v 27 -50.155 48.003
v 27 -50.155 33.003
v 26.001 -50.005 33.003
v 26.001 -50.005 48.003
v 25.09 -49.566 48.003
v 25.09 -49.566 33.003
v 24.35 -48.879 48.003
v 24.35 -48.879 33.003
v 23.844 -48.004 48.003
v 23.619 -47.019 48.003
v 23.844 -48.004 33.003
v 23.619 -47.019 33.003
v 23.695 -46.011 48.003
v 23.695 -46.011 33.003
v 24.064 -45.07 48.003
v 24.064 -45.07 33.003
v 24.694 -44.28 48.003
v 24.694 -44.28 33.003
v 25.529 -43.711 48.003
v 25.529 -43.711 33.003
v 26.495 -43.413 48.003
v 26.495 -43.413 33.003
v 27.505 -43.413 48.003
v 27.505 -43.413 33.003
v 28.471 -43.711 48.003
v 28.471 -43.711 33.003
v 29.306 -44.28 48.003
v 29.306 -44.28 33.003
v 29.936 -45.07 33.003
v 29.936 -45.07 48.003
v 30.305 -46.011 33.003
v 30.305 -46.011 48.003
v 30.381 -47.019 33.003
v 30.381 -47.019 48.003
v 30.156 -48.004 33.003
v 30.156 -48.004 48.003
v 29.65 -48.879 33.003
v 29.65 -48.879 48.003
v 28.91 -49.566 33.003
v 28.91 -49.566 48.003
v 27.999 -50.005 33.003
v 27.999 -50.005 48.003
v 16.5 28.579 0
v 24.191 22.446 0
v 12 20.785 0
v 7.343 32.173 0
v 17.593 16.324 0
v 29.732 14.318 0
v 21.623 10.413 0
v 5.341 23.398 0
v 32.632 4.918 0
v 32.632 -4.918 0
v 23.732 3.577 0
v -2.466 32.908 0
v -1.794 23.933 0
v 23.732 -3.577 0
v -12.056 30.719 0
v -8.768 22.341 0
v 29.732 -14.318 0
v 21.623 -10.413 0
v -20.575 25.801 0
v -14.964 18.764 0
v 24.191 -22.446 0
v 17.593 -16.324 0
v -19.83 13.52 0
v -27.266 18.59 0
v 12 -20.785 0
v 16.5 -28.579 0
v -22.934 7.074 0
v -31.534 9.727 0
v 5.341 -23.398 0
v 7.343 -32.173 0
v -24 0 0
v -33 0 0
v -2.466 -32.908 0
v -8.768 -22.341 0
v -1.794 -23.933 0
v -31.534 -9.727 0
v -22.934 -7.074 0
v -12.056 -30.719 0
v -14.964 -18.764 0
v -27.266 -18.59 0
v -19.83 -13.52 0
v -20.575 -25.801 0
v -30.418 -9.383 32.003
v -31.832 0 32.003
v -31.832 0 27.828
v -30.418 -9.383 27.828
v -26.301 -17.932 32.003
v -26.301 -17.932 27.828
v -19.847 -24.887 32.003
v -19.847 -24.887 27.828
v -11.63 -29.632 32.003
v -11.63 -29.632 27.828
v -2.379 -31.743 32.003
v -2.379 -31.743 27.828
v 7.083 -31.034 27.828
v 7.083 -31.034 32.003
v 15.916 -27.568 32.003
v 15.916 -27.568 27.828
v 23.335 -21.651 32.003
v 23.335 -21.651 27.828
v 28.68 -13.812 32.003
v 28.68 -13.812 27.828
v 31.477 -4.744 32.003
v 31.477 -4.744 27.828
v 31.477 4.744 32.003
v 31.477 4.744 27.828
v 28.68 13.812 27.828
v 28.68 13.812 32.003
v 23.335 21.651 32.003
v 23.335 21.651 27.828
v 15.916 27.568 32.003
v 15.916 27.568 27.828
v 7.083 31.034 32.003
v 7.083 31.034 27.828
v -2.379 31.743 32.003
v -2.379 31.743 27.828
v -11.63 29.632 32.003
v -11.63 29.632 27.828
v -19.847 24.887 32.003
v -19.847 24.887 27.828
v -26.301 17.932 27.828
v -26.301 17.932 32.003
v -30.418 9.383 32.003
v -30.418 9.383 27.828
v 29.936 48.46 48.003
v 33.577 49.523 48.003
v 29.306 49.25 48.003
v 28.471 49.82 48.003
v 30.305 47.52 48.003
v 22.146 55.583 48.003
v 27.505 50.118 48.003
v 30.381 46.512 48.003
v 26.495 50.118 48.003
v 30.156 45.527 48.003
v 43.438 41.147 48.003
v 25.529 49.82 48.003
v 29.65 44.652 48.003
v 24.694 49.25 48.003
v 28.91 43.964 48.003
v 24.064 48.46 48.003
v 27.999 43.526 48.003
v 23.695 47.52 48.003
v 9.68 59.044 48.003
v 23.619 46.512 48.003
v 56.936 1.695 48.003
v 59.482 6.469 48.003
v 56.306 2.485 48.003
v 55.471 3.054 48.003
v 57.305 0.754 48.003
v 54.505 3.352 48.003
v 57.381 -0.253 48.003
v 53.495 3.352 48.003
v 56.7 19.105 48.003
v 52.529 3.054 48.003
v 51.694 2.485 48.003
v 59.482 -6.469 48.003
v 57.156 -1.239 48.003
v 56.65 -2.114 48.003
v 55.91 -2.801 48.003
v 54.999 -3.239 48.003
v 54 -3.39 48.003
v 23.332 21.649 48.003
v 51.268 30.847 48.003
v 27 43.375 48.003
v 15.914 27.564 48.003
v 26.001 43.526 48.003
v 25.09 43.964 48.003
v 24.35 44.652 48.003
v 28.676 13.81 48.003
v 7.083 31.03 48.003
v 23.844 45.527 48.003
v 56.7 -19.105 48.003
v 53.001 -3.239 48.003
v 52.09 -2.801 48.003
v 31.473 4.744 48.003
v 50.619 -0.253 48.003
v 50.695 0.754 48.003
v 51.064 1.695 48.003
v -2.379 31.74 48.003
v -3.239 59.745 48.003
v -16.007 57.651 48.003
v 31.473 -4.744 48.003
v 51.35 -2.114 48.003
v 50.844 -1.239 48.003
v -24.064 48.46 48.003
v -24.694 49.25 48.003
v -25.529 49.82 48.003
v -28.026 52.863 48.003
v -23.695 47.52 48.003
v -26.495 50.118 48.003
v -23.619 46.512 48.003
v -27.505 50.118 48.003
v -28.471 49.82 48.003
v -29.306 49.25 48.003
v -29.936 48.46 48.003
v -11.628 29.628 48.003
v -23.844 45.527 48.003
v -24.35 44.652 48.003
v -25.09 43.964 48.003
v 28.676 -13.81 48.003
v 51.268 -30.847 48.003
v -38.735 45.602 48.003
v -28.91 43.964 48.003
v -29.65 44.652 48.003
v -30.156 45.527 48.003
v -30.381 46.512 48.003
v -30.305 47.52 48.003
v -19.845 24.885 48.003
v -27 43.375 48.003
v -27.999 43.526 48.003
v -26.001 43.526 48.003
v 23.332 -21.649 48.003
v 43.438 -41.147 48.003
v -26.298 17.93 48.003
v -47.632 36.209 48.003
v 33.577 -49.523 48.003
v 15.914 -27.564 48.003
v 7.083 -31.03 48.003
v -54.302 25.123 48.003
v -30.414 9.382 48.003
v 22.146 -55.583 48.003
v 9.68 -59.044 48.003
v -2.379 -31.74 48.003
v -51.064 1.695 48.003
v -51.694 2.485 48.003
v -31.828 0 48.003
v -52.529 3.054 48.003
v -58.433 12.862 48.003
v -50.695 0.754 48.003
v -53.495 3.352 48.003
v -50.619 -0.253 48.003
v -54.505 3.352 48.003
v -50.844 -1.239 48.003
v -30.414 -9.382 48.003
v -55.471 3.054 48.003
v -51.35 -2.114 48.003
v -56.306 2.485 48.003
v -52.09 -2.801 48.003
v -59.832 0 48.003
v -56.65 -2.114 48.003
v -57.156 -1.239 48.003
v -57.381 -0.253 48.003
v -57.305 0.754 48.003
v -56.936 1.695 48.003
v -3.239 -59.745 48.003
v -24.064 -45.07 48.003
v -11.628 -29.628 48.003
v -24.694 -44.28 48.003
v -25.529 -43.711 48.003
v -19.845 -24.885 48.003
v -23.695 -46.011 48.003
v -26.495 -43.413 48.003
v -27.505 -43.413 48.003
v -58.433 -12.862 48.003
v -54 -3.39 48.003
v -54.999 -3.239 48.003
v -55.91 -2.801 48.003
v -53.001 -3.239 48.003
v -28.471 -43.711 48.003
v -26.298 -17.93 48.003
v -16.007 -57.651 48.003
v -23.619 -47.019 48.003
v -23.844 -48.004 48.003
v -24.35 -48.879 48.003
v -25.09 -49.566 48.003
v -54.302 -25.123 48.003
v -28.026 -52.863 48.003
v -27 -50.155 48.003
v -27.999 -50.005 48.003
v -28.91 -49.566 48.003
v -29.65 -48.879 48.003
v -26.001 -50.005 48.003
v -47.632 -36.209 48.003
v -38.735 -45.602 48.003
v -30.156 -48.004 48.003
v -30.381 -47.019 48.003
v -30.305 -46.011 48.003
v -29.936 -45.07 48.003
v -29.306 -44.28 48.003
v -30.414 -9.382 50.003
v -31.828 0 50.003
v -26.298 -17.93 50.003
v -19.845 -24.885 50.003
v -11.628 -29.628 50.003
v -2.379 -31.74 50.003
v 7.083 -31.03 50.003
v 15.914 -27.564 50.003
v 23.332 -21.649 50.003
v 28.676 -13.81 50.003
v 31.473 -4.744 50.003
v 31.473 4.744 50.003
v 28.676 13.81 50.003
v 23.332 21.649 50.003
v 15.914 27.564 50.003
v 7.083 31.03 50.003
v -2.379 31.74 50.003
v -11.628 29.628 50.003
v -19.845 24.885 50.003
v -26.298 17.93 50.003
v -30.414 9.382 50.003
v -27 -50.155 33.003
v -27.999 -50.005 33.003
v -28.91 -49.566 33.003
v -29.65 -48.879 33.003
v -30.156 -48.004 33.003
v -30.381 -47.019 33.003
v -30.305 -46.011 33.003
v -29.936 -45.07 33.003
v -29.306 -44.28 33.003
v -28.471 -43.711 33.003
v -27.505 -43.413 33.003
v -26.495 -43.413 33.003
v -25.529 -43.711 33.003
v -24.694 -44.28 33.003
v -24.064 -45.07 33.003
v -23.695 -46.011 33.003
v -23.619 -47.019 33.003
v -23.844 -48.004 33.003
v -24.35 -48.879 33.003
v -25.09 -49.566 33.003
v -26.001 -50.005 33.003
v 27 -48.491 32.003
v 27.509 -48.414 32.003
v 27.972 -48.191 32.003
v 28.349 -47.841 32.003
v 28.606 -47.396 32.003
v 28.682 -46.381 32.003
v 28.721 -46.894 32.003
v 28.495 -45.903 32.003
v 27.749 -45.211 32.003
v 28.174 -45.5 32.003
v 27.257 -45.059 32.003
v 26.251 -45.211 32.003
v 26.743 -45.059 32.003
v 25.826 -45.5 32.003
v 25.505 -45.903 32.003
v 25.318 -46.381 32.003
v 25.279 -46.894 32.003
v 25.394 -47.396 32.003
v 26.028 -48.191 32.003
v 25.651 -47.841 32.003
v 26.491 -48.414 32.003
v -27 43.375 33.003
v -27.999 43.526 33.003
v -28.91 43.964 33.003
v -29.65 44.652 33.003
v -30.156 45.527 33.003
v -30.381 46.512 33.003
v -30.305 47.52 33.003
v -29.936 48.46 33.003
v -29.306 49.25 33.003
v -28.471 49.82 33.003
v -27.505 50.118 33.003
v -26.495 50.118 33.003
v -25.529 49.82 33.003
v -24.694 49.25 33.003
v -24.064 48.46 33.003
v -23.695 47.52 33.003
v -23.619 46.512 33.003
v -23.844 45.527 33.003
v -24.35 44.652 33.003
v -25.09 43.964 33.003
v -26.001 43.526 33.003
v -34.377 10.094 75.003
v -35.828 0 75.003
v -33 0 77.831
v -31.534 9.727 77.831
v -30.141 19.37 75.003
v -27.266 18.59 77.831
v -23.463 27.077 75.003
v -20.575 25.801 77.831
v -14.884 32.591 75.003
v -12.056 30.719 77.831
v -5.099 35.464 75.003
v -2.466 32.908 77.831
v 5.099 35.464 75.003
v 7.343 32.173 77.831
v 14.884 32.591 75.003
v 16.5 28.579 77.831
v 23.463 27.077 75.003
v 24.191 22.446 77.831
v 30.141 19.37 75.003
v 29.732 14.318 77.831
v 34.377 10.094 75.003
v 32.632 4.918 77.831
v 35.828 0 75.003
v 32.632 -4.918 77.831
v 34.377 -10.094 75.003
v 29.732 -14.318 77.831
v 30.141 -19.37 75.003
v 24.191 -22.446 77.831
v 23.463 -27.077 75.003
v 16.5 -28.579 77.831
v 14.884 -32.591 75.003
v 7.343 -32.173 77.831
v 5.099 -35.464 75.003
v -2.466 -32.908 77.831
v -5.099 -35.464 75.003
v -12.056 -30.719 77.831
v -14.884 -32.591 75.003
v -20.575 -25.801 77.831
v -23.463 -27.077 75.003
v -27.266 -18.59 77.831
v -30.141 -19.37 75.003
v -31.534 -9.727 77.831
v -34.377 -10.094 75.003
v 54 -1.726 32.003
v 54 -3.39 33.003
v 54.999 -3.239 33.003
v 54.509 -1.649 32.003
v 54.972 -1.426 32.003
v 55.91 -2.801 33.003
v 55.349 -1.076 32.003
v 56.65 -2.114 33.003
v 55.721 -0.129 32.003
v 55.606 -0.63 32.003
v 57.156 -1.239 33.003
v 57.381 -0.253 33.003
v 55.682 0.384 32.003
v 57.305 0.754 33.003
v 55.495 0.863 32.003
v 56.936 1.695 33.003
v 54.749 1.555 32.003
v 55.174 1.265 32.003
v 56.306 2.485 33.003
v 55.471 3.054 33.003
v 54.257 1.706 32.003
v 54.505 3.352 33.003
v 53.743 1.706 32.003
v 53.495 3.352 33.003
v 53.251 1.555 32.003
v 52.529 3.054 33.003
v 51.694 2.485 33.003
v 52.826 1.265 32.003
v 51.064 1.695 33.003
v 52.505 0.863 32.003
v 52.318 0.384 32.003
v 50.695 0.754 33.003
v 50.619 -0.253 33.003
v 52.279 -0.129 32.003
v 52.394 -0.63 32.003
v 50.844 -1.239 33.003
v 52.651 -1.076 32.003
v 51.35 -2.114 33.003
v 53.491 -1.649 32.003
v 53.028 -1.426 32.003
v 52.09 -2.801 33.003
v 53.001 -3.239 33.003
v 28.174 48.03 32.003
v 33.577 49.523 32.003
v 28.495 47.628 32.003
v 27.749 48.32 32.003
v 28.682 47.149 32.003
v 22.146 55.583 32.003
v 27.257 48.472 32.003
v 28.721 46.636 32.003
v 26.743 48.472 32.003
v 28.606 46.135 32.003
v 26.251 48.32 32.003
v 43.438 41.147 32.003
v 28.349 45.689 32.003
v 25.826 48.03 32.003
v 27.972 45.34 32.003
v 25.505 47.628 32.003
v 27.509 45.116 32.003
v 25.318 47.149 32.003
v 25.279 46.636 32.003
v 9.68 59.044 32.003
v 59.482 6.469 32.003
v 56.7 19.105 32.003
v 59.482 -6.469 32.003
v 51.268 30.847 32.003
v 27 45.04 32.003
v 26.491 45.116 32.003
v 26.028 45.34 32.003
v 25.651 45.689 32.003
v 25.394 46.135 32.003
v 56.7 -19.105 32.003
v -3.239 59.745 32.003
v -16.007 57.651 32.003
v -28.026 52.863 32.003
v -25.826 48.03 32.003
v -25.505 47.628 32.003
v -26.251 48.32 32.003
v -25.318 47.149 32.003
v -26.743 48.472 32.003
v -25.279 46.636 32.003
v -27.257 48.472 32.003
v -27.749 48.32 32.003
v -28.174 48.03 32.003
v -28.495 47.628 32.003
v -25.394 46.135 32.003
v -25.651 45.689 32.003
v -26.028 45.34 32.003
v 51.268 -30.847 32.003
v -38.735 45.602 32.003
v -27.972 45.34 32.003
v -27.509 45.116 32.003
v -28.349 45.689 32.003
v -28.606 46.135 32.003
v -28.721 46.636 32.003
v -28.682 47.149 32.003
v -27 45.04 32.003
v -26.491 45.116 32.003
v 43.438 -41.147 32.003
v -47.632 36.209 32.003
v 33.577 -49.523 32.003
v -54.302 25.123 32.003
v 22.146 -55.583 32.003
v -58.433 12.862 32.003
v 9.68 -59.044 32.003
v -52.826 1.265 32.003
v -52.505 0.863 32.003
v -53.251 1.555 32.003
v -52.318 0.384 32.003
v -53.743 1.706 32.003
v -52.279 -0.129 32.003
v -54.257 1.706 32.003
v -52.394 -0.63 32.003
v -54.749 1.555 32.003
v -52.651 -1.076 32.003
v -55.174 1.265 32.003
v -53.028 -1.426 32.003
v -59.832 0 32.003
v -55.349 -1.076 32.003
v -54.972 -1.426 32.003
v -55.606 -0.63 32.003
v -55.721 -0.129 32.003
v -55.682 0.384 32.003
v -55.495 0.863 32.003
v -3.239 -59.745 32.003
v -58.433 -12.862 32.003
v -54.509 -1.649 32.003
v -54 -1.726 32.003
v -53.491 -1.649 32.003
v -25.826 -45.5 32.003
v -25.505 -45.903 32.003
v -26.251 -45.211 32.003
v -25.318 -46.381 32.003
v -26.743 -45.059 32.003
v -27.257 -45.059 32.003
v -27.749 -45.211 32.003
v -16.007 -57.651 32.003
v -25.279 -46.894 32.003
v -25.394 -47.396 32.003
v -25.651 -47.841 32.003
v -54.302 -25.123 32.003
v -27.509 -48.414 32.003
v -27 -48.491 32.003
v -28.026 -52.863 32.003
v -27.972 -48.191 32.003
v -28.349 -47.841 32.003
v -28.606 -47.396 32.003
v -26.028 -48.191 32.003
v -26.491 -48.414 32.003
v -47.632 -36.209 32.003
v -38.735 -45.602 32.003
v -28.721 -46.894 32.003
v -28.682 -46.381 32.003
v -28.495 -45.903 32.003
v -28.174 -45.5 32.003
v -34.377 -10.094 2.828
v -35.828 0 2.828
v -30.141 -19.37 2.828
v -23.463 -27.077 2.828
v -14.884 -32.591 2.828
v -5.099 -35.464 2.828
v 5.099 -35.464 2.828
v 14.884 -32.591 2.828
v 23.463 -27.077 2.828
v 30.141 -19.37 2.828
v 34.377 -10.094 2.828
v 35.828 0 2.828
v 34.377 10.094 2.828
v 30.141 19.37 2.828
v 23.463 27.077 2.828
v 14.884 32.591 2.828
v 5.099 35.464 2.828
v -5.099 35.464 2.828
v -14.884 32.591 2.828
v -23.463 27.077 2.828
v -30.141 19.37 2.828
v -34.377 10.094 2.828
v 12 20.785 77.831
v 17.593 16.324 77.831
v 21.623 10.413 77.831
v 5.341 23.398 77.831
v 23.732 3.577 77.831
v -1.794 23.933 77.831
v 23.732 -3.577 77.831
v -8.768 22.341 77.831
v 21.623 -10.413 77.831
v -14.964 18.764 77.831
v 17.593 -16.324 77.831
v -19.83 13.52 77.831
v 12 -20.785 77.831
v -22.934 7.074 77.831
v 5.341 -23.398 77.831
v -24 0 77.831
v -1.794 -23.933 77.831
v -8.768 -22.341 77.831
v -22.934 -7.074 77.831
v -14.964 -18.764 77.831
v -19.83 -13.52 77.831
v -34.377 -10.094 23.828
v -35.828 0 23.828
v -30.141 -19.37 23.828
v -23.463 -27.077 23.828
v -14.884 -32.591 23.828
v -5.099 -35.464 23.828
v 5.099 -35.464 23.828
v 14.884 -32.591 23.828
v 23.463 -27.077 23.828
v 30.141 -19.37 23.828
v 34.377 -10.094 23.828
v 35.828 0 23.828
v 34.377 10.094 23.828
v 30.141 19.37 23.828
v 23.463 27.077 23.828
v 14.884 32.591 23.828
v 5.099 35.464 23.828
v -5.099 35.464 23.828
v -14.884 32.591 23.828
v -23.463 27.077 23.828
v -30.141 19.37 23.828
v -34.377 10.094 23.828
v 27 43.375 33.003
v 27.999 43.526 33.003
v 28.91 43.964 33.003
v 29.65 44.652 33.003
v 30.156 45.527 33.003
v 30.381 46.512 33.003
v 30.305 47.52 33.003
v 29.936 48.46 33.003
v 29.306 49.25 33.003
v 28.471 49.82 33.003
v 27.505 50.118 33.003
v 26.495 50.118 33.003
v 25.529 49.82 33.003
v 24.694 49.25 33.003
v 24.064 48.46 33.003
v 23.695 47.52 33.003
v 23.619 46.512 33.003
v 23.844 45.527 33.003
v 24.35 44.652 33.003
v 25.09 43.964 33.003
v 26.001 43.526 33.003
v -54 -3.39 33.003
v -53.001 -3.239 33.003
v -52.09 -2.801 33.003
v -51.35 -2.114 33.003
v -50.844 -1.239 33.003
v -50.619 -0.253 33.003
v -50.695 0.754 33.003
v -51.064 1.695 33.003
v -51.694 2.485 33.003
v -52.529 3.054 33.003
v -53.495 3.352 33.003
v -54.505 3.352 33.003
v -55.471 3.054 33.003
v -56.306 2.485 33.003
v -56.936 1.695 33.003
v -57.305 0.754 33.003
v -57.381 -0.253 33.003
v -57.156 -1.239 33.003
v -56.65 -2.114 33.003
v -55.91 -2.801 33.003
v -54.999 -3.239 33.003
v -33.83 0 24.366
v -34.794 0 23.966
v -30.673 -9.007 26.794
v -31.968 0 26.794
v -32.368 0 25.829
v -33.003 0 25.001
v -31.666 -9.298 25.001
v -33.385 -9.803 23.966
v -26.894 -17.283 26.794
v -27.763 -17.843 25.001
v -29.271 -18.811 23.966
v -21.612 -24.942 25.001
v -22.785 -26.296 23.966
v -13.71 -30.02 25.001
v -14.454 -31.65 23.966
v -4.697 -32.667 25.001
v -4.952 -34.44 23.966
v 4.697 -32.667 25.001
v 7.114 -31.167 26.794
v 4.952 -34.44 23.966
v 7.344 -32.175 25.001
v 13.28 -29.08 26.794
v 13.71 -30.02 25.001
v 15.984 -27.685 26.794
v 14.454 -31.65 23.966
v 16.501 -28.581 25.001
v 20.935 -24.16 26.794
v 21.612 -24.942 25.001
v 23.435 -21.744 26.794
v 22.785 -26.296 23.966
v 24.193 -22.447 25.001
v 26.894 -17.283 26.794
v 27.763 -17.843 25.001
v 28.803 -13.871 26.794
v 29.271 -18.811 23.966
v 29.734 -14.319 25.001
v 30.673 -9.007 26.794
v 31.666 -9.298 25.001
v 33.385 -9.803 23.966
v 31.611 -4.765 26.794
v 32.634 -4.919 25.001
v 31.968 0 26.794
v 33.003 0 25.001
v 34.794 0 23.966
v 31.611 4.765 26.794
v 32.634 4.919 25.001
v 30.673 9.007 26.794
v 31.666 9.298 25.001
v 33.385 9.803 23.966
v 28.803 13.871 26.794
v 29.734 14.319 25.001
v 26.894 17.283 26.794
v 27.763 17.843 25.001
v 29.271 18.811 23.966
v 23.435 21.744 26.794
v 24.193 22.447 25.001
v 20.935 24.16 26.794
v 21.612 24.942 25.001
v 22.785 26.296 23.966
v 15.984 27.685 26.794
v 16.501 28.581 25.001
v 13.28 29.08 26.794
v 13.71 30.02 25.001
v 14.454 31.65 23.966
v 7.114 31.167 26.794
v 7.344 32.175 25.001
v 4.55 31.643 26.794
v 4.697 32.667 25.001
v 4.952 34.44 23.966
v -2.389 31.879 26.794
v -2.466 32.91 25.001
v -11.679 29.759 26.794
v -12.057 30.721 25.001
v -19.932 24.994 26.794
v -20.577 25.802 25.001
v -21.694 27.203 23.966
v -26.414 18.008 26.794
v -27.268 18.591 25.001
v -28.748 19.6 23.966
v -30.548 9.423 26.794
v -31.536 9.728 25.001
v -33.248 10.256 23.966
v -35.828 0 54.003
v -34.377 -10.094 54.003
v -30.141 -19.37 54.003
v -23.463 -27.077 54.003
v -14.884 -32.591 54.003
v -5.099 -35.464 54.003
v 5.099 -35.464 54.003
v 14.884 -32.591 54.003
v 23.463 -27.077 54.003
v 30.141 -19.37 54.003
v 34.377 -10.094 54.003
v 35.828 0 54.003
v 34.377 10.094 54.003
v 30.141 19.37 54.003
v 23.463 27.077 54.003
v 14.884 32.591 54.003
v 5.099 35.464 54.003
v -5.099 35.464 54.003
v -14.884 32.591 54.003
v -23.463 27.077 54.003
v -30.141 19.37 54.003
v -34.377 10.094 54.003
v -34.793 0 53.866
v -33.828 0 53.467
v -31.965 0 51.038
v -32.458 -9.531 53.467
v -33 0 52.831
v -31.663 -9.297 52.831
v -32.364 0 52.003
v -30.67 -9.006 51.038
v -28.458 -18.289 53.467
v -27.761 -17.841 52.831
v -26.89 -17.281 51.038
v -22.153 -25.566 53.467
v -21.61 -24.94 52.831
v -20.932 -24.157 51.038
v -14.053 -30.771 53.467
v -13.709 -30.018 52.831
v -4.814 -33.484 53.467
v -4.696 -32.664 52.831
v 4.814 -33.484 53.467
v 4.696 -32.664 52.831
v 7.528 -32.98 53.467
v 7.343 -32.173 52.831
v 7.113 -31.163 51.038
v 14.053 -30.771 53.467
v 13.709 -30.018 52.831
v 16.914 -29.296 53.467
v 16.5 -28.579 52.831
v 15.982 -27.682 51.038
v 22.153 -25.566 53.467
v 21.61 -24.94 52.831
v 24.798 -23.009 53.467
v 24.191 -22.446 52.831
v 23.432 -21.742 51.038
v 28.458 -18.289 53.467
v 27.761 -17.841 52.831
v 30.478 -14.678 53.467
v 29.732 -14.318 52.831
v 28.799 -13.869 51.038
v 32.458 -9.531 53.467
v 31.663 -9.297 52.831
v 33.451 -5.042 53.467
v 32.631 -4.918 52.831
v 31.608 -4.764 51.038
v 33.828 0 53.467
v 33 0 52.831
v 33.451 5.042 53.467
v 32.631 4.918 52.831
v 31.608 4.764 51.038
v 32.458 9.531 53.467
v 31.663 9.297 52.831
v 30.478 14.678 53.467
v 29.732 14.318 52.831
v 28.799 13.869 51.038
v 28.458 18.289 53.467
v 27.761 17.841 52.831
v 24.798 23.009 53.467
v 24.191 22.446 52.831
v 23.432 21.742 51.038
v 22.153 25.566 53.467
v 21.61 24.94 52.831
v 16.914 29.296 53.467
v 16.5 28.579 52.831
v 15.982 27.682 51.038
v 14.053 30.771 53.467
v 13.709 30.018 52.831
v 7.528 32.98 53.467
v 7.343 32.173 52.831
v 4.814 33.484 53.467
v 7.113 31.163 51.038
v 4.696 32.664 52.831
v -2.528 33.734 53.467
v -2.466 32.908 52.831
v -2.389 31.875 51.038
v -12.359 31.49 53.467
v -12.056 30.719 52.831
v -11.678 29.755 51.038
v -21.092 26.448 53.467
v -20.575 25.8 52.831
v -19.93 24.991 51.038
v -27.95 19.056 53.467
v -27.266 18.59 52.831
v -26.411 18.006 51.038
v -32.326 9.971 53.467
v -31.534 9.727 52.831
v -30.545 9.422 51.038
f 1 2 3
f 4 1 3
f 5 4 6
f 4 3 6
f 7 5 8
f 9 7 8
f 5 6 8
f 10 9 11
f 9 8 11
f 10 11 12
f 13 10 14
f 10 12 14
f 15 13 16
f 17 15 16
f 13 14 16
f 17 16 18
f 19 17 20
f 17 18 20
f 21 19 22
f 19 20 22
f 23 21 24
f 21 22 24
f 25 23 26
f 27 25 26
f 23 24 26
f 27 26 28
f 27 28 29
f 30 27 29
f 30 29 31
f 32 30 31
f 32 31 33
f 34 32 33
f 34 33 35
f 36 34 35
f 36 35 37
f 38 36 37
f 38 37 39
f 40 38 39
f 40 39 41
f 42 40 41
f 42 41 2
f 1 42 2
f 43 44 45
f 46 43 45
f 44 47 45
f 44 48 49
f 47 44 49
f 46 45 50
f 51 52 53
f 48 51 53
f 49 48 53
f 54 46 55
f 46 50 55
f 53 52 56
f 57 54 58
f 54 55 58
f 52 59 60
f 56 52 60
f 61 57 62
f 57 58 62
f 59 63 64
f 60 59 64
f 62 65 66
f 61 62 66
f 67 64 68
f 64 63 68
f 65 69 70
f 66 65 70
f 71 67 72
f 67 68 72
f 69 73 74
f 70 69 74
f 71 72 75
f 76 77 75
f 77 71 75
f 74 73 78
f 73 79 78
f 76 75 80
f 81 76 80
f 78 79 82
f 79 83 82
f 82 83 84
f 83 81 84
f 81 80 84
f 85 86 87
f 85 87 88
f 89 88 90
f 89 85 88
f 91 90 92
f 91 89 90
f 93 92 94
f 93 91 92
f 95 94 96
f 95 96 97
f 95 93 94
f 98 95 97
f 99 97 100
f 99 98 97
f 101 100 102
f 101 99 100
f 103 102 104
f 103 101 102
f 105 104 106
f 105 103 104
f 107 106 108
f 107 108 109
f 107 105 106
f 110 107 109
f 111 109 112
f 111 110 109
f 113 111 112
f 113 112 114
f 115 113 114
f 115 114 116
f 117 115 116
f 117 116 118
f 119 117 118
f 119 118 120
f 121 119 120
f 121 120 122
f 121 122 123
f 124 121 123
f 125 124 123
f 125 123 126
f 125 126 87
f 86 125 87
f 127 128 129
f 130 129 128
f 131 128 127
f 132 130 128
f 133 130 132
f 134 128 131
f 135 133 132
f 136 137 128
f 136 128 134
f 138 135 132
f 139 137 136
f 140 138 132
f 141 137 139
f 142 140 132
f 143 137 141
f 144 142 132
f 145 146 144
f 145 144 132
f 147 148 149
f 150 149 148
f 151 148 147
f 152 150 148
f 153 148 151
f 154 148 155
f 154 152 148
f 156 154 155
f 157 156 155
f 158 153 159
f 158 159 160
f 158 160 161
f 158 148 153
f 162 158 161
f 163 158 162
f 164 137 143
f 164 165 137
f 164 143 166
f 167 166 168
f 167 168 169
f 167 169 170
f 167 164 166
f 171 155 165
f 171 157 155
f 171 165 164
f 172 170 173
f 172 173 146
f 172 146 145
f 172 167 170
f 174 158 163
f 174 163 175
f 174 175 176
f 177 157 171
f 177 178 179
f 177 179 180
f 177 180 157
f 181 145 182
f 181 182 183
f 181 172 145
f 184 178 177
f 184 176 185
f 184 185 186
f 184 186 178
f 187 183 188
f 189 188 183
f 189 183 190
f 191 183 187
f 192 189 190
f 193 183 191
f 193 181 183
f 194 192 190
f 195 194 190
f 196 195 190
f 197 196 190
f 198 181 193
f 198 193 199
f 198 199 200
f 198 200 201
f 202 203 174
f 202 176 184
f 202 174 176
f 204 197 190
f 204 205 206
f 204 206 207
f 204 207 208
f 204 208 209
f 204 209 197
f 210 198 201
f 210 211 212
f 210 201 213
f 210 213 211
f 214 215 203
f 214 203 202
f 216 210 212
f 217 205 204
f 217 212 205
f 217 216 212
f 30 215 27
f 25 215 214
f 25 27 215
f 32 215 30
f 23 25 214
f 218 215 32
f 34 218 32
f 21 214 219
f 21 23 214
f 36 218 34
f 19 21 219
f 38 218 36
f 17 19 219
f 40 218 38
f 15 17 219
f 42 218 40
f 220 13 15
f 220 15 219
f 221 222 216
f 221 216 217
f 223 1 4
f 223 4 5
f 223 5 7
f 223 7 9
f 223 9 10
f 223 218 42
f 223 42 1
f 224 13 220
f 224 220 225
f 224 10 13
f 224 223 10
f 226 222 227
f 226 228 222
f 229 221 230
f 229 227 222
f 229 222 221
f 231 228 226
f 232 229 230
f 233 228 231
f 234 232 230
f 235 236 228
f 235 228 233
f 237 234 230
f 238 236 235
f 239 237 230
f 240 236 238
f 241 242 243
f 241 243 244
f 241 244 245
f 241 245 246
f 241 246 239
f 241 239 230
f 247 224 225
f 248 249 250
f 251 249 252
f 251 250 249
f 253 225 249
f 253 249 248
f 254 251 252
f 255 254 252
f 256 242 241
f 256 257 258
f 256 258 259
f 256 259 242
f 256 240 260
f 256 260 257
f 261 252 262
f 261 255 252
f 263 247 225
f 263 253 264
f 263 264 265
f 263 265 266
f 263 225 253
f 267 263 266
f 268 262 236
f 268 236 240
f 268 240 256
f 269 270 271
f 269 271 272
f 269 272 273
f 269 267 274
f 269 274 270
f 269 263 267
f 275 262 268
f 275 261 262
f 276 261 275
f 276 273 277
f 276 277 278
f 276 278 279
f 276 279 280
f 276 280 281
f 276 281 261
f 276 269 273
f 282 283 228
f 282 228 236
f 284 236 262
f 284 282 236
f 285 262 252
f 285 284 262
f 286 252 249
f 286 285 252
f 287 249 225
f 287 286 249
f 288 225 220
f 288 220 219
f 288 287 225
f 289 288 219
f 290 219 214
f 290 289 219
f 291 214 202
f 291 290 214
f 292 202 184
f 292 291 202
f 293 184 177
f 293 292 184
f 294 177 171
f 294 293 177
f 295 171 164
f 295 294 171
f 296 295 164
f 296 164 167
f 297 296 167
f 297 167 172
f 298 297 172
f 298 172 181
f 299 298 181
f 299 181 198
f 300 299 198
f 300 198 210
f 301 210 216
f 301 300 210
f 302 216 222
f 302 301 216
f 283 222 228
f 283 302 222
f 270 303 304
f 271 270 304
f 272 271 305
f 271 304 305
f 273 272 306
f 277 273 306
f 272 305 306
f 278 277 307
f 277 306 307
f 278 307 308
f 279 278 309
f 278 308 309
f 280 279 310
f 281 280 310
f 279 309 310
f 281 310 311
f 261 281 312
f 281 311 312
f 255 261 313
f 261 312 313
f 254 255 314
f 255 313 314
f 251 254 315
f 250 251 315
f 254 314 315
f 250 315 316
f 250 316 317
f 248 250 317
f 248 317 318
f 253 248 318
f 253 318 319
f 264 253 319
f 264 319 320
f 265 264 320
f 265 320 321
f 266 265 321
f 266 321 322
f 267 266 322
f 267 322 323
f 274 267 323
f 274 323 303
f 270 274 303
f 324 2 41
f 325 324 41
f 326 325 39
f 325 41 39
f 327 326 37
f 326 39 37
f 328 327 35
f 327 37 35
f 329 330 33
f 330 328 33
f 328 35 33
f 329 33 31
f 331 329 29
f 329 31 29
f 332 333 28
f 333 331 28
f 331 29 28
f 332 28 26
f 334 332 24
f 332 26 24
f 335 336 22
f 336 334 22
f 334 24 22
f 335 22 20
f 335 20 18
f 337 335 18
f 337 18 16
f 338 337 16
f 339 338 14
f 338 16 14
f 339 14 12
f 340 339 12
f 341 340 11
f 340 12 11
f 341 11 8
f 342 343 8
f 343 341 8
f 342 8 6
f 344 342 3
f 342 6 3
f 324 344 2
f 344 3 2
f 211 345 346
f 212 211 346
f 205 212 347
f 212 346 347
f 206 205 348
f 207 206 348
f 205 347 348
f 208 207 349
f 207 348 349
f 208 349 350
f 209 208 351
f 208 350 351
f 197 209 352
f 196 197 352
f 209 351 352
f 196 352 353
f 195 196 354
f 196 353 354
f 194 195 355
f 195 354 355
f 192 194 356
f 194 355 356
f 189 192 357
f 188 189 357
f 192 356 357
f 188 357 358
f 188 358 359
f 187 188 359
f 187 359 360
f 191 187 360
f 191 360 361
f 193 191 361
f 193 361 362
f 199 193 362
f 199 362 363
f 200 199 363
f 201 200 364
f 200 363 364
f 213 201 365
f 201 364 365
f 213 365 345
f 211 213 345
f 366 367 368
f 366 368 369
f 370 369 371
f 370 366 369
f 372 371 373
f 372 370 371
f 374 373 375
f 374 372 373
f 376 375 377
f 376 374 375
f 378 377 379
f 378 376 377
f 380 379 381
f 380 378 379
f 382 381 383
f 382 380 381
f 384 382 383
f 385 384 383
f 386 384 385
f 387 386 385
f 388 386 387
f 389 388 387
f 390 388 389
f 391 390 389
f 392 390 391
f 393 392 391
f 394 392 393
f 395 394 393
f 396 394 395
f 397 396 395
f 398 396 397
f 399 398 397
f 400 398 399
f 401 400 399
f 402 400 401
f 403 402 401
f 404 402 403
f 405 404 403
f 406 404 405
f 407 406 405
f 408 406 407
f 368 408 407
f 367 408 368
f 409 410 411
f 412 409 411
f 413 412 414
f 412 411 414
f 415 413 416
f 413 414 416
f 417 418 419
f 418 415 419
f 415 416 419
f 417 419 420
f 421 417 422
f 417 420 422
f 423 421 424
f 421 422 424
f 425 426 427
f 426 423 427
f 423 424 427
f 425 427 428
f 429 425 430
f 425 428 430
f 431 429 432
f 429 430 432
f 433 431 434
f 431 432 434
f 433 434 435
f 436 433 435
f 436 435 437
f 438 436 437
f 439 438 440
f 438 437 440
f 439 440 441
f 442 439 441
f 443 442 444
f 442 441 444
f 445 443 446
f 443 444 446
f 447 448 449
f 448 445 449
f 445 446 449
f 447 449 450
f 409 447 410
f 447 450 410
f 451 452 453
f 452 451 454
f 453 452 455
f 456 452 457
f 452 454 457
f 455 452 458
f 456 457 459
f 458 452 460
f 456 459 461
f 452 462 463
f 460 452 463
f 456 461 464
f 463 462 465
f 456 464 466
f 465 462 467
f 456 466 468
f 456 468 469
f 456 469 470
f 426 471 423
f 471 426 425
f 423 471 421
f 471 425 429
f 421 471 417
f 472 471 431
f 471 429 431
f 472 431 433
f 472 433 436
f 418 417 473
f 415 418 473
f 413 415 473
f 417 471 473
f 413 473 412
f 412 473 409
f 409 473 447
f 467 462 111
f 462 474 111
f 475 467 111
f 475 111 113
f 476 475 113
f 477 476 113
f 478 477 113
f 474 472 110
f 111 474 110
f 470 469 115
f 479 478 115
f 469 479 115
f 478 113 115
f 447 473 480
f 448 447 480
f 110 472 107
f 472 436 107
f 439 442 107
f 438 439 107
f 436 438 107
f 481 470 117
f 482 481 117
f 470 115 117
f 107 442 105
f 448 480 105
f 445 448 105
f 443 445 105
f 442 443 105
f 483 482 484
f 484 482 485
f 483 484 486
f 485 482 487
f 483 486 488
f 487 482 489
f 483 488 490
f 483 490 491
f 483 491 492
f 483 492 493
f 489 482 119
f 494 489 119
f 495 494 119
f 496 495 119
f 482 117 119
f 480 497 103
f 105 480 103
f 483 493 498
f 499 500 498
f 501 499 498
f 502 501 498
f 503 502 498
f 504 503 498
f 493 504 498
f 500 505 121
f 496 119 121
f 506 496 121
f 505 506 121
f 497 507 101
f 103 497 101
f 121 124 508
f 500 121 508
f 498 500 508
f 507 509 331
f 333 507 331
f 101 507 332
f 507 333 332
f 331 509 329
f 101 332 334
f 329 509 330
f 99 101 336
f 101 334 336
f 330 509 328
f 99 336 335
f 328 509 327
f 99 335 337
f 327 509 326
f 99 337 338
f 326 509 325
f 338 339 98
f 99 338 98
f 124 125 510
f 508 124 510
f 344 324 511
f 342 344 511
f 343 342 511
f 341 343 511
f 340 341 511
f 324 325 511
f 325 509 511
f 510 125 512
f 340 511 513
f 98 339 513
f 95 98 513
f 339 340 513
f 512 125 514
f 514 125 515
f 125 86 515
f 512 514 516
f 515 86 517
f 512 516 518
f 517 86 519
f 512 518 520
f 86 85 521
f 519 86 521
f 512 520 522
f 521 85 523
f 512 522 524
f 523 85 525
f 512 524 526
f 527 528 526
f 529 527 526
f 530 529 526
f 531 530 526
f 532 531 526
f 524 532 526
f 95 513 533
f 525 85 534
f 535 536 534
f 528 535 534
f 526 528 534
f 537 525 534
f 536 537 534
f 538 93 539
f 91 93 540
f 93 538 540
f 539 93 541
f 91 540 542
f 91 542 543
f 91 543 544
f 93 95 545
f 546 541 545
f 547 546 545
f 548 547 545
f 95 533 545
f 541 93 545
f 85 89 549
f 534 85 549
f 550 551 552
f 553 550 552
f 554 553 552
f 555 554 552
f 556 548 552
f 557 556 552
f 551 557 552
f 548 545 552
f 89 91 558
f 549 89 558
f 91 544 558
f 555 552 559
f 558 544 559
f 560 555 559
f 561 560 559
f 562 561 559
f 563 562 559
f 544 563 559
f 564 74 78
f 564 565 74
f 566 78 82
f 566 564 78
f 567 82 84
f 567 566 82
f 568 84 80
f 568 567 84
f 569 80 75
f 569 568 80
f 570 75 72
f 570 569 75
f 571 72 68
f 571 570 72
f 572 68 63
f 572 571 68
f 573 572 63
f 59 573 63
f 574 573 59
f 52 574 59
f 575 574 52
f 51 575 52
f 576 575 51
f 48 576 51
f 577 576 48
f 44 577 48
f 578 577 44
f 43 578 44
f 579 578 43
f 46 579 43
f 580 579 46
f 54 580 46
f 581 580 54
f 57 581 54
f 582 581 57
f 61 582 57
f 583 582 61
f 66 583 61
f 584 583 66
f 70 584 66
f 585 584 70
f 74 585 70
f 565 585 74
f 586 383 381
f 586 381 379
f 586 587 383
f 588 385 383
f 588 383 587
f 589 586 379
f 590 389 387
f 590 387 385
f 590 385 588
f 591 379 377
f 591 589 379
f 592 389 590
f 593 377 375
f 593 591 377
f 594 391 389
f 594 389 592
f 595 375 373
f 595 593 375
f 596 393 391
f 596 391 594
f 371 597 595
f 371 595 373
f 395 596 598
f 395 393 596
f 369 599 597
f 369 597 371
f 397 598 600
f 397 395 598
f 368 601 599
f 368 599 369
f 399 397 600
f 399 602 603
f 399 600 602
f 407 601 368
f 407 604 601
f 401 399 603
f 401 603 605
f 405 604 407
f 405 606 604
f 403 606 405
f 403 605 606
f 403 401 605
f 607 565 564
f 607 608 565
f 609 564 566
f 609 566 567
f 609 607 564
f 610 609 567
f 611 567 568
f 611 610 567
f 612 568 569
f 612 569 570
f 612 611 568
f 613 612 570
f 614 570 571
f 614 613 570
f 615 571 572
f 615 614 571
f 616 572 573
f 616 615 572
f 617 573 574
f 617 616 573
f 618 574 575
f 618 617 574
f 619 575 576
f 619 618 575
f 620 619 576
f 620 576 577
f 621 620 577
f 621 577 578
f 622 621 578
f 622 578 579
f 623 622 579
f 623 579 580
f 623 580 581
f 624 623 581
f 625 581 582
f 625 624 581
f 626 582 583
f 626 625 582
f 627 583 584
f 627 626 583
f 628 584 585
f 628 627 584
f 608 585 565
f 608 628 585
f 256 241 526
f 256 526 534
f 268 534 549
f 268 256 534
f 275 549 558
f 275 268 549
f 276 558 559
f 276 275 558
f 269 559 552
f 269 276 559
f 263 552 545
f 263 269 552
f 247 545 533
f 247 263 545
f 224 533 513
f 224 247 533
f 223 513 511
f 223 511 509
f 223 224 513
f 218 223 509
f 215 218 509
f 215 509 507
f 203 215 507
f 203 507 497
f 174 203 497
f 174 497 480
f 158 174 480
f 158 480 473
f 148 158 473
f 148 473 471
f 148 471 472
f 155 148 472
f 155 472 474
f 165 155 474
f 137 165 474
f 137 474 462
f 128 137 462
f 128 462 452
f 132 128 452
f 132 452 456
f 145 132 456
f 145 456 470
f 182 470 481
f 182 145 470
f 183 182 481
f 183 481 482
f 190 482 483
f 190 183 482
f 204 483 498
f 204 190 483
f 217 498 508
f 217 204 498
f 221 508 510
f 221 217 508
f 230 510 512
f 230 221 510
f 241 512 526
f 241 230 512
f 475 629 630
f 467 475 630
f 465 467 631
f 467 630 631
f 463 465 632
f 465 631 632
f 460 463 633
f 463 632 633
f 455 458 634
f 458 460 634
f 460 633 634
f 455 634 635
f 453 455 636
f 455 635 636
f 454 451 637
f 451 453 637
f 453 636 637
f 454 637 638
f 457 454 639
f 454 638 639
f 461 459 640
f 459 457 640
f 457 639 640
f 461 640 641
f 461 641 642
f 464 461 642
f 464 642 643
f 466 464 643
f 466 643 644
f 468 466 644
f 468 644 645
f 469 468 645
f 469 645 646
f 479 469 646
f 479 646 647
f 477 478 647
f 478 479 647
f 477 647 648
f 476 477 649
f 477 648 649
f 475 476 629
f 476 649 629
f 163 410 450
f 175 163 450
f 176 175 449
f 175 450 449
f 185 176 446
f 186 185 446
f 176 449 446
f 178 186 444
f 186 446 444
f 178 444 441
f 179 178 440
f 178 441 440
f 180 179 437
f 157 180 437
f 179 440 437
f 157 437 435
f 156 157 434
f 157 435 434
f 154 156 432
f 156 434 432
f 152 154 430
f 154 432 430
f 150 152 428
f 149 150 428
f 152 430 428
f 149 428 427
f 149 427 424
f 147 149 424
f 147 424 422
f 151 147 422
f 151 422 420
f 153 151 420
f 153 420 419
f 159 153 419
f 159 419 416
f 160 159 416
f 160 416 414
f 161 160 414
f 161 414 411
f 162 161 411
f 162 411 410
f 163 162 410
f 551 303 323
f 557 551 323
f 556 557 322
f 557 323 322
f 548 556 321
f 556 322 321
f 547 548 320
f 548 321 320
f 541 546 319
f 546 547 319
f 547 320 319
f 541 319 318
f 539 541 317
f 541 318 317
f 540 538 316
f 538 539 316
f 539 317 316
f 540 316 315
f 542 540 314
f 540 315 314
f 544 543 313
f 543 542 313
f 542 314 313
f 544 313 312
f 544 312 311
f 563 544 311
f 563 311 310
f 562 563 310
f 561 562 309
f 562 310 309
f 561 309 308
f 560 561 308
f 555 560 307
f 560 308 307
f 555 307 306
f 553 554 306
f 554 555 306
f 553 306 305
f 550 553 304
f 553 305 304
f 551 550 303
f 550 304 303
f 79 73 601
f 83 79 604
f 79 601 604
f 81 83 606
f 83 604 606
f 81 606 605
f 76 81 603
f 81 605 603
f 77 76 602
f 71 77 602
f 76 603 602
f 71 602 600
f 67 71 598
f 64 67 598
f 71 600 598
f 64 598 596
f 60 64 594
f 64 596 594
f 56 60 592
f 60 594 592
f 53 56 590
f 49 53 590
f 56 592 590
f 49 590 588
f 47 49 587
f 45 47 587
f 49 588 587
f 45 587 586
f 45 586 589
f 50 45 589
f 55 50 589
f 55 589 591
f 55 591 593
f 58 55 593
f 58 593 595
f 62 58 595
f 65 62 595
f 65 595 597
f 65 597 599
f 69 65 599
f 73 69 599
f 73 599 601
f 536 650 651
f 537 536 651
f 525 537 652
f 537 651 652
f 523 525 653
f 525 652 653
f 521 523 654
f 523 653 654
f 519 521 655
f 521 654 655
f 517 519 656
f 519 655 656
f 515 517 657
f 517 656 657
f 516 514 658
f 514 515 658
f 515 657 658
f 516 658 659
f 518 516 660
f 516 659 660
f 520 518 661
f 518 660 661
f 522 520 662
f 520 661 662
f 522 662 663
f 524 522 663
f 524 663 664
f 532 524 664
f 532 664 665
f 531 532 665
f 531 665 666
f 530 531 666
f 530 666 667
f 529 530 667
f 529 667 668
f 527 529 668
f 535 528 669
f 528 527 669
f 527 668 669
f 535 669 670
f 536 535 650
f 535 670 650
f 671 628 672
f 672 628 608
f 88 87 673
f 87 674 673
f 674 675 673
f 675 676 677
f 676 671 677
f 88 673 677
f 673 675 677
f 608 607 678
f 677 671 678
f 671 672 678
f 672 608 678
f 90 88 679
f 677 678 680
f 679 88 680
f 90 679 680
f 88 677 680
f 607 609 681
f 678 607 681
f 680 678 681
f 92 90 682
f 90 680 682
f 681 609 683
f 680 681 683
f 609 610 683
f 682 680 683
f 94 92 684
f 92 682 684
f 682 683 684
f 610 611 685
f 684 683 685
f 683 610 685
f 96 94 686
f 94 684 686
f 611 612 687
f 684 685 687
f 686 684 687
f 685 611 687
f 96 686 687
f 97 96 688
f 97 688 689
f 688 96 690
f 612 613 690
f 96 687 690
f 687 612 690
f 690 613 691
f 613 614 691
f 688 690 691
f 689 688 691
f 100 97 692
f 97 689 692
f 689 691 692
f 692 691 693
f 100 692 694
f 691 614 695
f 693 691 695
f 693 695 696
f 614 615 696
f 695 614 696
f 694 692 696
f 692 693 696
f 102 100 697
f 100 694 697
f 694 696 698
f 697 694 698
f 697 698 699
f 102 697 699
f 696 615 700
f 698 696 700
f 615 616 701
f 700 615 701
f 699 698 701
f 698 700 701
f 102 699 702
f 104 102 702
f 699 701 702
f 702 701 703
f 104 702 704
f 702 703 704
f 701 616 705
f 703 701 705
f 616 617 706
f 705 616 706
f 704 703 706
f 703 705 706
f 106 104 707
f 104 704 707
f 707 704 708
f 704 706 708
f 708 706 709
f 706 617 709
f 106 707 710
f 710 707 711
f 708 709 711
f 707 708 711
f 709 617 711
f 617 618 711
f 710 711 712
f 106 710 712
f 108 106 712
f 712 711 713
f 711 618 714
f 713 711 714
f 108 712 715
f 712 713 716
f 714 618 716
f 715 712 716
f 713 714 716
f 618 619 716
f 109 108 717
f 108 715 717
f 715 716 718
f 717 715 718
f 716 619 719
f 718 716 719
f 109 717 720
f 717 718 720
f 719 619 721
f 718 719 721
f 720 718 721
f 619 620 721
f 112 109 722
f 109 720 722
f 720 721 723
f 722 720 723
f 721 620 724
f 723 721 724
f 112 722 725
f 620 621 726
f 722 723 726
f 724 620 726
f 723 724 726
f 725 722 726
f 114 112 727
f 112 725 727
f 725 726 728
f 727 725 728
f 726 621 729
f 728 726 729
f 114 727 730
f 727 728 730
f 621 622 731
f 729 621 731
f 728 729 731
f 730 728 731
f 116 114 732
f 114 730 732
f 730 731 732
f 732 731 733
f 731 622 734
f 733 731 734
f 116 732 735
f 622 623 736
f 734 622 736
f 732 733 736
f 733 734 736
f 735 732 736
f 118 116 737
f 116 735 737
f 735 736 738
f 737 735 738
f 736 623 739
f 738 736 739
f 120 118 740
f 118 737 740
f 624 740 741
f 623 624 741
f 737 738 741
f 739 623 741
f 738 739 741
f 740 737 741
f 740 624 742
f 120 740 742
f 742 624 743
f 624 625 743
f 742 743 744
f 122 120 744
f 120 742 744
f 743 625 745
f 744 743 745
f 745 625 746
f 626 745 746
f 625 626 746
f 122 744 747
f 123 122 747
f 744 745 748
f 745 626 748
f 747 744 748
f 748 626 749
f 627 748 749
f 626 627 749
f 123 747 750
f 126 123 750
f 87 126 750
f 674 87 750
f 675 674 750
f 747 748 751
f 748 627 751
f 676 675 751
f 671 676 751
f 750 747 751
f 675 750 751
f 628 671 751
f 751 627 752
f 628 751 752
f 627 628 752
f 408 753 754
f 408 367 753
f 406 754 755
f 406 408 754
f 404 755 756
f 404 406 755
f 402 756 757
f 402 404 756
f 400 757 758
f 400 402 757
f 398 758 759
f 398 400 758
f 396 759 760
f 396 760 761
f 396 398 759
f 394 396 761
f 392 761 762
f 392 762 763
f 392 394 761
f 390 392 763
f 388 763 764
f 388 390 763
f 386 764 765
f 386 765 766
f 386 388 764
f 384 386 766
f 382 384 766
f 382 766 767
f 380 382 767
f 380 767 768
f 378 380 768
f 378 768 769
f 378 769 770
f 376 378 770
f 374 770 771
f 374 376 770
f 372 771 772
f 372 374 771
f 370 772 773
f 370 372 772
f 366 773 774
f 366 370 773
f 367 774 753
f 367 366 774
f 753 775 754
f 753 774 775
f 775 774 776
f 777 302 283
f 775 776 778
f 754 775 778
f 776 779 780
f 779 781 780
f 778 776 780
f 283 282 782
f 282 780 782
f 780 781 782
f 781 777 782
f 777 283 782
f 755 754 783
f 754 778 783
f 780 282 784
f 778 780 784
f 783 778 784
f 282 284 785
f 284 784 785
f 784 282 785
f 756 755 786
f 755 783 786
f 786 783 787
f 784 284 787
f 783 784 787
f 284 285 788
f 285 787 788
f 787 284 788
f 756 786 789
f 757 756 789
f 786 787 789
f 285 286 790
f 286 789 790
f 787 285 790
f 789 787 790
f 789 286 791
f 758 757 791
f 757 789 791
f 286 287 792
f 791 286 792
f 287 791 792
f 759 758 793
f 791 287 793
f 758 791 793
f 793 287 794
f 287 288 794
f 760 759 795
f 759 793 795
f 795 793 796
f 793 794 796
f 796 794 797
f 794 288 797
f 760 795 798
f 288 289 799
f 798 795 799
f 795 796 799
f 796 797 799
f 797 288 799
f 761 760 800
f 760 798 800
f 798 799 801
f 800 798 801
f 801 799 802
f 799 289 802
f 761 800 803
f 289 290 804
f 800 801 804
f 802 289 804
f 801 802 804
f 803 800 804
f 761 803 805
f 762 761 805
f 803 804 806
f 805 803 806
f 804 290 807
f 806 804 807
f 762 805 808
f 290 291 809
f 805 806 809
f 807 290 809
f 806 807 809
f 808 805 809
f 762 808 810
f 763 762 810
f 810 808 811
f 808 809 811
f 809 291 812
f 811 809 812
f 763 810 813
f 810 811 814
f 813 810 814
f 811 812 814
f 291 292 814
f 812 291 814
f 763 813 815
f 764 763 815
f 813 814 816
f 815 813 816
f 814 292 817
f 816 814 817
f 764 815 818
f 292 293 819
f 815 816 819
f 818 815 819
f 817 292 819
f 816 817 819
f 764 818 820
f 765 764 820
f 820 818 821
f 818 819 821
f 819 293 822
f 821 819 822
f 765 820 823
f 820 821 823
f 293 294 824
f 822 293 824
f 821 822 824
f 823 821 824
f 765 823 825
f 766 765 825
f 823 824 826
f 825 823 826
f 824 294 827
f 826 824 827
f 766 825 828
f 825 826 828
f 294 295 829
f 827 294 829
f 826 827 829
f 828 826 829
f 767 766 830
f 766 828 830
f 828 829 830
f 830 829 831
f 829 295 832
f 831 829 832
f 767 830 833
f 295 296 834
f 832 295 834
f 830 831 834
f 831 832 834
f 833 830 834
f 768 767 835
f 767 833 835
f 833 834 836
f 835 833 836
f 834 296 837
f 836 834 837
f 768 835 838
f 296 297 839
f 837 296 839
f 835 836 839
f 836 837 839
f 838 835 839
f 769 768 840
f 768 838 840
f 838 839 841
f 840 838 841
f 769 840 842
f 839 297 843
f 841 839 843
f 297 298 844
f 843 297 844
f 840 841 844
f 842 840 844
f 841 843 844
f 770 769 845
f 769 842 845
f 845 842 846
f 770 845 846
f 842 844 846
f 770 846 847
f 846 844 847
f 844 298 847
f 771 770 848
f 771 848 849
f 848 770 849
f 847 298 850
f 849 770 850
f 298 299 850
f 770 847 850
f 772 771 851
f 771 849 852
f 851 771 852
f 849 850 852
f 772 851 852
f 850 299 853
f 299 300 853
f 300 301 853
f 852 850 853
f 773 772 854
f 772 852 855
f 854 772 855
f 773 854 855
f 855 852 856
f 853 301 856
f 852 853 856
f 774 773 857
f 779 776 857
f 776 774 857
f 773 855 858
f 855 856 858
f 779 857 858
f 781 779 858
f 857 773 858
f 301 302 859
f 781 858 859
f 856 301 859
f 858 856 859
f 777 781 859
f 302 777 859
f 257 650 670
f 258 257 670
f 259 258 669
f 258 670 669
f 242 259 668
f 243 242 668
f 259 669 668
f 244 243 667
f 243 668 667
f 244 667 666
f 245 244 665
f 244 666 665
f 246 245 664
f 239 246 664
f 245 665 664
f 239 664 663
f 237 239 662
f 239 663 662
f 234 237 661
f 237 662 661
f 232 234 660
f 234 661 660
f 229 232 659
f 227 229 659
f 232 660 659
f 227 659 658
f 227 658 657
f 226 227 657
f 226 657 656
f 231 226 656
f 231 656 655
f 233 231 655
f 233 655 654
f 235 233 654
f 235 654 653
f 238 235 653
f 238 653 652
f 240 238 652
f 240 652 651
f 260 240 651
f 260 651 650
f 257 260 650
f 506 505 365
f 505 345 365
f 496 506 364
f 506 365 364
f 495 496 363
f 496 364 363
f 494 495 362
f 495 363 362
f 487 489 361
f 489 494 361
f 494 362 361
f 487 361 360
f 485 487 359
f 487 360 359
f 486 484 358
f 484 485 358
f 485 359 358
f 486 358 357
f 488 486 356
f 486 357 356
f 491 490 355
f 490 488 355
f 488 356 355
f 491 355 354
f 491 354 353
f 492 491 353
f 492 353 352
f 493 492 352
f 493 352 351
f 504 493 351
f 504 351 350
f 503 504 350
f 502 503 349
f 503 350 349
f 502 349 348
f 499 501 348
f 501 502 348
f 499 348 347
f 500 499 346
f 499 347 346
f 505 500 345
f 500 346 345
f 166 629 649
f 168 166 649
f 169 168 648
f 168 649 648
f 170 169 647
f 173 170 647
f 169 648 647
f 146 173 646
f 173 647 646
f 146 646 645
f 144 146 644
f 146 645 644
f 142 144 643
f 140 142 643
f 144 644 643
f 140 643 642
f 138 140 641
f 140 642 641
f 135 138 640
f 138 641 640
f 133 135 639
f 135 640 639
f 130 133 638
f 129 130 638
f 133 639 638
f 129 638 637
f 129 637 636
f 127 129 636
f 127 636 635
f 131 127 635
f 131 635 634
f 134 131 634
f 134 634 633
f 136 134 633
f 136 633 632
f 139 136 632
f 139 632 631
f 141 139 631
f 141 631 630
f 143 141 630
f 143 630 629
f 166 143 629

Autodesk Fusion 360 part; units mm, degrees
sketch "Sketch1" plane through (0, 0, 0) normal (0, 1, 0) x (1, 0, 0)
  line L0 (-33.0001, 0) -> (-35.8285, -2.8284)
  line L1 (-33.0001, 0) -> (-33.002, 0) construction
  line L2 (-35.8285, -2.8284) -> (-35.8285, -23.8284)
  line L3 (-31.8323, -27.8284) -> (-31.8323, -32.0026)
  line L4 (-31.8323, -32.0026) -> (-59.8323, -32.0026)
  line L5 (-59.8323, -32.0026) -> (-59.8323, -48.0026)
  line L6 (-59.8323, -48.0026) -> (-31.8285, -48.0026)
  line L7 (-31.8285, -48.0026) -> (-31.8285, -50.0026)
  line L8 (-35.8285, -54.0026) -> (-35.8285, -75.0026)
  line L9 (-35.8285, -75.0026) -> (-33.0001, -77.8311)
  line L10 (-33.0001, -77.8311) -> (-1.0001, -77.8311)
  line L11 (-33.002, 0) -> (-1.002, 0)
  arc A0 (-35.8285, -54.0026) -> (-31.8285, -50.0026) centre (-35.8285, -50.0026) ccw
  arc A1 (-31.8323, -27.8284) -> (-35.8285, -23.8284) centre (-35.8323, -27.8284) ccw
  line L12 (-1.0001, -77.8311) -> (-1.002, 0)
  point P0 (-31.8323, -24.0026)
  point P1 (-31.8285, -54.0026)
  point P2 (-4.832, 0)
  dimension "d2" = 135
  dimension "d3" = 4
  dimension "d4" = 21
  dimension "d5" = 4
  dimension "d6" = 8
  dimension "d7" = 28
  dimension "d8" = 16
  dimension "d9" = 6
  dimension "d10" = 4
  dimension "d11" = 21
  dimension "d12" = 4
  dimension "d13" = 135
  dimension "d14" = 32
  dimension "d15" = 32
  dimension "d16" = 4
  dimension "d17" = 4
revolve "Revolve1" add sketch "Sketch1" angle 360 about axis through (0, 0, 1.75) along (0, 0, 1)
sketch "Sketch2" plane through (0, 0, 77.8311) normal (0, 0, 1) x (-1, 0, 0)
  circle A0 centre (0, 0) radius 1.0001
  circle A1 centre (0, 0) radius 33.0001
  circle A2 centre (0, 0) radius 24
  dimension "d19" = 48
extrude "Extrude1" cut sketch "Sketch2" against normal blind 110 contours A2
sketch "Sketch3" plane through (0, 0, 48.0026) normal (0, 0, 1) x (-1, 0, 0)
  circle A0 centre (0, 0) radius 31.8285
  circle A1 centre (0, 0) radius 59.8323
  circle A2 centre (0, 0) radius 54
  circle A3 centre (53.999, -0.3261) radius 4
  line L0 (0, 0) -> (27, -46.7654)
  line L1 (0, 0) -> (54, 0) construction
  circle A4 centre (27, -46.7654) radius 4
  line L2 (0, 0) -> (-27, -46.7654)
  line L3 (0, 0) -> (54, 0) construction
  circle A5 centre (-27, -46.7654) radius 4
  circle A6 centre (-54, 0) radius 4
  line L4 (0, 0) -> (-27, 46.7654)
  line L5 (0, 0) -> (54, 0) construction
  line L6 (0, 0) -> (27, 46.7654)
  line L7 (0, 0) -> (54, 0) construction
  circle A7 centre (27, 46.7654) radius 4
  circle A8 centre (-27, 46.7654) radius 4
  dimension "d22" = 108
  dimension "d23" = 8
  dimension "d24" = 60
  dimension "d25" = 8
  dimension "d26" = 120
  dimension "d27" = 8
  dimension "d28" = 8
  dimension "d29" = 120
  dimension "d30" = 60
  dimension "d31" = 54
  dimension "d32" = 8
  dimension "d33" = 8
hole "Hole1" at (-54, 0, 48.0026) at (-27, 46.7654, 48.0026) at (27, 46.7654, 48.0026) at (54, 0, 48.0026) at (27, -46.7654, 48.0026) at (-27, -46.7654, 48.0026) direction (0, 0, -1) diameter 6.78 depth 15 tip angle 118
extrude "Extrude2" [suppressed]
